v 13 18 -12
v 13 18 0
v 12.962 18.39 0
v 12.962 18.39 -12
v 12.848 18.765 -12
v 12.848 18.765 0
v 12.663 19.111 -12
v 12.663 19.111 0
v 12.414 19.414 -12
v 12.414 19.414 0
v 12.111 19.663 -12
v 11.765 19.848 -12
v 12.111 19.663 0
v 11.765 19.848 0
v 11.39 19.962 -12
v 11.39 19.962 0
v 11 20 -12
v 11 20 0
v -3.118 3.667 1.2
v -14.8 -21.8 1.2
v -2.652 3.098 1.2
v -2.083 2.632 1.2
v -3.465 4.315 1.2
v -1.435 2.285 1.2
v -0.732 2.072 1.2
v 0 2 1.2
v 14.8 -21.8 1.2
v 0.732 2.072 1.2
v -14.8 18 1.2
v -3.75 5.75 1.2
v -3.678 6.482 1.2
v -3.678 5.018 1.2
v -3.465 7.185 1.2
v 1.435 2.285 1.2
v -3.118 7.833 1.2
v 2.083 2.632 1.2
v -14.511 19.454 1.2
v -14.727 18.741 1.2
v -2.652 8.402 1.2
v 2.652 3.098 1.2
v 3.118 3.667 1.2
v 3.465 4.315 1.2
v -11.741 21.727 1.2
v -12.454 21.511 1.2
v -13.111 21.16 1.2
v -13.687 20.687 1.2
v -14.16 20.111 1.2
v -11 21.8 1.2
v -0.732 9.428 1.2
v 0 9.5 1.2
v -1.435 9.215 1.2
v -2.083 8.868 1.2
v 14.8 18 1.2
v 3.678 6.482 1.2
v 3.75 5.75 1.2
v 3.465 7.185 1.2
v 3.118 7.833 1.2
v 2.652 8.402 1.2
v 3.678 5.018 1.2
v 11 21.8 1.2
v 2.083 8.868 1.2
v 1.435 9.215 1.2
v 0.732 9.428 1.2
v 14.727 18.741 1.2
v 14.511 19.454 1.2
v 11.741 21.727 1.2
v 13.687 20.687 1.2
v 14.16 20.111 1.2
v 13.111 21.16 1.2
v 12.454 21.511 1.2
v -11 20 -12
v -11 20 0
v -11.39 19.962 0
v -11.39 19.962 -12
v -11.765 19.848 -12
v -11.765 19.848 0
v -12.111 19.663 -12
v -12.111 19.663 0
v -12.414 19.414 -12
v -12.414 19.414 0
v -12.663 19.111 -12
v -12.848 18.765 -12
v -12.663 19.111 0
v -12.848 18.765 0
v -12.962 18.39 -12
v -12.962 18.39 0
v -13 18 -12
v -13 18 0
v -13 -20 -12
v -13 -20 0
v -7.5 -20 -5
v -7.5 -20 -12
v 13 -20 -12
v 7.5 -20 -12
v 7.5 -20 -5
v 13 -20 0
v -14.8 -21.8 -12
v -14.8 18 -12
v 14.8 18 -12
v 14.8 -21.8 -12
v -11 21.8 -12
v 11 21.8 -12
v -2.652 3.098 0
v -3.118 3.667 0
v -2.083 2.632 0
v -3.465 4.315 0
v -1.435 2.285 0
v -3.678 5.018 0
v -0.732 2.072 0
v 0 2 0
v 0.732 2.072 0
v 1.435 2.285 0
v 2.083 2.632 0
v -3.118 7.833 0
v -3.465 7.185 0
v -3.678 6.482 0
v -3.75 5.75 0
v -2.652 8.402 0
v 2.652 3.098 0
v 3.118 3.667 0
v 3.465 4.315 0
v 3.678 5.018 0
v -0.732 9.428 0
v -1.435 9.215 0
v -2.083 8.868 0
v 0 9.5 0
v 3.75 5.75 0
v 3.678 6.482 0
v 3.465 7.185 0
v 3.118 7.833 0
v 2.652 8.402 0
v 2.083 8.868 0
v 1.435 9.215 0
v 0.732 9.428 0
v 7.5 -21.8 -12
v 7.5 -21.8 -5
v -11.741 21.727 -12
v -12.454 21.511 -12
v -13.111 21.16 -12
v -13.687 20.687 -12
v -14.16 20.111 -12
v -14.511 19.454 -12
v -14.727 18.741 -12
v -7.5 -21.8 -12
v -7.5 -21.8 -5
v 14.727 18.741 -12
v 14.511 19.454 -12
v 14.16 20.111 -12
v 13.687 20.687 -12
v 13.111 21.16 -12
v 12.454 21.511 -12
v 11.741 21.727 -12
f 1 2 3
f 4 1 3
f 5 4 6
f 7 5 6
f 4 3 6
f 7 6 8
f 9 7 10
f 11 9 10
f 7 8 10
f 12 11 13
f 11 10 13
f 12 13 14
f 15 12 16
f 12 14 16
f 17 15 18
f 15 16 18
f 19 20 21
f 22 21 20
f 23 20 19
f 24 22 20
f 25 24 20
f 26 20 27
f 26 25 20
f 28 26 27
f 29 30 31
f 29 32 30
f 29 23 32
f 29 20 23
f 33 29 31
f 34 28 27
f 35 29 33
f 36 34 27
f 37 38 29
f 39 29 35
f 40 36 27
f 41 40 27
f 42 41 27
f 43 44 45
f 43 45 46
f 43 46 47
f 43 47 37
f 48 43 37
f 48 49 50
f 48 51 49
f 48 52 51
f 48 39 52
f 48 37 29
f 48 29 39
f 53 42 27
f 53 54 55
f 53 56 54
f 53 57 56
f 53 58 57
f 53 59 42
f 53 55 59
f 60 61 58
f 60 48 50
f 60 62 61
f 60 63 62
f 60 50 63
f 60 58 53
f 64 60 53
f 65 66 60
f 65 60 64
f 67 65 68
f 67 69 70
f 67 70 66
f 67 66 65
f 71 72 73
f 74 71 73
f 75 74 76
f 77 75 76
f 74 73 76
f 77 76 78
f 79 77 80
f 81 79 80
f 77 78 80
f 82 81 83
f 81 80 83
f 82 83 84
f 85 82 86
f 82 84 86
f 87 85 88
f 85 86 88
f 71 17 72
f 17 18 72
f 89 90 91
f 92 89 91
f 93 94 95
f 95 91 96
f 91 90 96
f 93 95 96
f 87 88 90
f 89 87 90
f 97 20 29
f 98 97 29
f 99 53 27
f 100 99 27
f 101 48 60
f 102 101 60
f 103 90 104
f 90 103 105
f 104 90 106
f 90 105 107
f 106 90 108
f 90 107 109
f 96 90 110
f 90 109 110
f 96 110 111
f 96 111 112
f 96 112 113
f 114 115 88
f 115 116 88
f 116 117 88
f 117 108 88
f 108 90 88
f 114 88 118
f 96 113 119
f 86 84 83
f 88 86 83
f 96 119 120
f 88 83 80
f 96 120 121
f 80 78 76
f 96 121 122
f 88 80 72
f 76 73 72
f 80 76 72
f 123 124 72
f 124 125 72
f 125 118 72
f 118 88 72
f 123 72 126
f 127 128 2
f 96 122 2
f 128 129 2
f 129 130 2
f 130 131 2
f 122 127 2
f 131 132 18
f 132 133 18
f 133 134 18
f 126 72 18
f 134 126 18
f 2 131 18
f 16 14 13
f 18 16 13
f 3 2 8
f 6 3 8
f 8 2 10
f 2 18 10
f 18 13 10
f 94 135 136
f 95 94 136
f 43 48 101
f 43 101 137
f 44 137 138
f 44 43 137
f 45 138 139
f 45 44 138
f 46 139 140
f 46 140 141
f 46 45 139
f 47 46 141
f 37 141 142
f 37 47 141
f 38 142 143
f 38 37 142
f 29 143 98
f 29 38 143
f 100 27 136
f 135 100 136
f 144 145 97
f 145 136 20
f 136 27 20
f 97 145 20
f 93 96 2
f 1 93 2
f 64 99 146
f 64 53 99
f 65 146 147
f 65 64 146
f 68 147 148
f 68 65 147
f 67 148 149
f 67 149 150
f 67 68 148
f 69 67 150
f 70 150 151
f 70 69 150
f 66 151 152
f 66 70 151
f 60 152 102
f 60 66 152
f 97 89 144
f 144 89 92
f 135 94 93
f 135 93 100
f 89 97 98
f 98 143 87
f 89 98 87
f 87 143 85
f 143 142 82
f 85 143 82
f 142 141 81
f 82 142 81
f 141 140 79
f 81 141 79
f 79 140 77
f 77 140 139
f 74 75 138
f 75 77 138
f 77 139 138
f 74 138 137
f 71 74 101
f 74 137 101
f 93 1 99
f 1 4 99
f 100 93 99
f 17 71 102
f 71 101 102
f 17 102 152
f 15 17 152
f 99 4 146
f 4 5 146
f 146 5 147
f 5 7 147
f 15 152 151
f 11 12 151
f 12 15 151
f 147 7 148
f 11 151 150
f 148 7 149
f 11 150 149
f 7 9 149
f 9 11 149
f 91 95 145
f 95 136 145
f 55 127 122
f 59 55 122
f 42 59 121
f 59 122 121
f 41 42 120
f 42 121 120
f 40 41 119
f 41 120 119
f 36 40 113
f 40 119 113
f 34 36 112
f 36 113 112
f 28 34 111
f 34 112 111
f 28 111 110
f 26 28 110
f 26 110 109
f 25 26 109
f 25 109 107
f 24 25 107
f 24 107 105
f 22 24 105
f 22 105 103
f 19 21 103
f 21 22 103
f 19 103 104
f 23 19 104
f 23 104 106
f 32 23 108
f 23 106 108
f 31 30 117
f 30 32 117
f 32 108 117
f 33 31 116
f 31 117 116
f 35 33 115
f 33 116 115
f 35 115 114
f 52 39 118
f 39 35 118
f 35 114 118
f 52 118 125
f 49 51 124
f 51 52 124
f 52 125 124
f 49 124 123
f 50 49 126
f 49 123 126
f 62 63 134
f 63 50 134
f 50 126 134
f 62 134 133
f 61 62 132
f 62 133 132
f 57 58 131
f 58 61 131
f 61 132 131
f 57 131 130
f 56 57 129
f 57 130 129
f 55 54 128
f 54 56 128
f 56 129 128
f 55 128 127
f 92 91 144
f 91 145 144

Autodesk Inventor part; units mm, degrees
ref_plane "YZ Plane" through (0, 0, 0) normal (1, 0, 0) x (0, 1, 0)
ref_plane "XZ Plane" through (0, 0, 0) normal (0, 1, 0) x (-1, 0, 0)
ref_plane "XY Plane" through (0, 0, 0) normal (0, 0, 1) x (1, 0, 0)
sketch "Skizze1" plane through (0, 0, 0) normal (0, 0, 1) x (1, 0, 0)
  line L0 (-13, -20) -> (13, -20)
  line L1 (13, -20) -> (13, 18)
  line L2 (11, 20) -> (-11, 20)
  line L3 (-13, 18) -> (-13, -20)
  line L4 (-13, -20) -> (13, 20) construction
  line L5 (13, -20) -> (-13, 20) construction
  arc A0 (13, 18) -> (11, 20) centre (11, 18) ccw
  arc A1 (-11, 20) -> (-13, 18) centre (-11, 18) ccw
  line L6 (-11, 21.8) -> (11, 21.8)
  arc A2 (14.8, 18) -> (11, 21.8) centre (11, 18) ccw
  line L7 (14.8, 18) -> (14.8, -21.8)
  line L8 (14.8, -21.8) -> (-14.8, -21.8)
  line L9 (-14.8, -21.8) -> (-14.8, 18)
  arc A3 (-11, 21.8) -> (-14.8, 18) centre (-11, 18) ccw
  line L10 (-4.25, 10) -> (4.25, 10)
  line L11 (4.25, 10) -> (4.25, 1.5)
  line L12 (4.25, 1.5) -> (-4.25, 1.5)
  line L13 (-4.25, 1.5) -> (-4.25, 10)
  circle A4 centre (0, 5.75) radius 4.25 construction
  line L14 (0, 20) -> (0, -20) construction
  circle A5 centre (0, 5.75) radius 3.75
  point P0 (0, 0)
  dimension "d0" = 26
  dimension "d7" = 2
  dimension "d8" = 1.8
  dimension "d13" = 21.5
  dimension "d14" = 8.5
  dimension "d15" = 7.5
  dimension "d16" = 40
extrude "Extrusion1" add sketch "Skizze1" against normal blind 12 contours L6 A2 L7 L8 L9 A3
extrude "Extrusion2" add sketch "Skizze1" along normal blind 1.2 contours L3 A1 L2 A0 L1 L0 | L6 A2 L7 L8 L9 A3 | L10 L11 L12 L13
sketch "Skizze2" plane through (-14.8, -21.8, -12) normal (0, -1, 0) x (1, 0, 0)
  line L0 (0, 0) -> (0, 13.2) projected
  line L1 (29.6, 0) -> (0, 0) projected
  line L2 (29.6, 0) -> (29.6, 13.2) projected
  line L3 (0, 13.2) -> (29.6, 13.2) projected
  line L4 (3.8, 0) -> (25.8, 0) projected
  line L5 (7.3, 0) -> (22.3, 0)
  line L6 (22.3, 0) -> (22.3, 7)
  line L7 (22.3, 7) -> (7.3, 7)
  line L8 (7.3, 7) -> (7.3, 0)
  point P0 (14.8, 12)
  point P1 (14.8, 0)
  point P2 (22.3, 0)
  dimension "d9" = 15
  dimension "d10" = 7
extrude "Extrusion3" cut sketch "Skizze2" against normal up to next contours L8 L7 L6 L1
properties part number "Camera-Cover"
